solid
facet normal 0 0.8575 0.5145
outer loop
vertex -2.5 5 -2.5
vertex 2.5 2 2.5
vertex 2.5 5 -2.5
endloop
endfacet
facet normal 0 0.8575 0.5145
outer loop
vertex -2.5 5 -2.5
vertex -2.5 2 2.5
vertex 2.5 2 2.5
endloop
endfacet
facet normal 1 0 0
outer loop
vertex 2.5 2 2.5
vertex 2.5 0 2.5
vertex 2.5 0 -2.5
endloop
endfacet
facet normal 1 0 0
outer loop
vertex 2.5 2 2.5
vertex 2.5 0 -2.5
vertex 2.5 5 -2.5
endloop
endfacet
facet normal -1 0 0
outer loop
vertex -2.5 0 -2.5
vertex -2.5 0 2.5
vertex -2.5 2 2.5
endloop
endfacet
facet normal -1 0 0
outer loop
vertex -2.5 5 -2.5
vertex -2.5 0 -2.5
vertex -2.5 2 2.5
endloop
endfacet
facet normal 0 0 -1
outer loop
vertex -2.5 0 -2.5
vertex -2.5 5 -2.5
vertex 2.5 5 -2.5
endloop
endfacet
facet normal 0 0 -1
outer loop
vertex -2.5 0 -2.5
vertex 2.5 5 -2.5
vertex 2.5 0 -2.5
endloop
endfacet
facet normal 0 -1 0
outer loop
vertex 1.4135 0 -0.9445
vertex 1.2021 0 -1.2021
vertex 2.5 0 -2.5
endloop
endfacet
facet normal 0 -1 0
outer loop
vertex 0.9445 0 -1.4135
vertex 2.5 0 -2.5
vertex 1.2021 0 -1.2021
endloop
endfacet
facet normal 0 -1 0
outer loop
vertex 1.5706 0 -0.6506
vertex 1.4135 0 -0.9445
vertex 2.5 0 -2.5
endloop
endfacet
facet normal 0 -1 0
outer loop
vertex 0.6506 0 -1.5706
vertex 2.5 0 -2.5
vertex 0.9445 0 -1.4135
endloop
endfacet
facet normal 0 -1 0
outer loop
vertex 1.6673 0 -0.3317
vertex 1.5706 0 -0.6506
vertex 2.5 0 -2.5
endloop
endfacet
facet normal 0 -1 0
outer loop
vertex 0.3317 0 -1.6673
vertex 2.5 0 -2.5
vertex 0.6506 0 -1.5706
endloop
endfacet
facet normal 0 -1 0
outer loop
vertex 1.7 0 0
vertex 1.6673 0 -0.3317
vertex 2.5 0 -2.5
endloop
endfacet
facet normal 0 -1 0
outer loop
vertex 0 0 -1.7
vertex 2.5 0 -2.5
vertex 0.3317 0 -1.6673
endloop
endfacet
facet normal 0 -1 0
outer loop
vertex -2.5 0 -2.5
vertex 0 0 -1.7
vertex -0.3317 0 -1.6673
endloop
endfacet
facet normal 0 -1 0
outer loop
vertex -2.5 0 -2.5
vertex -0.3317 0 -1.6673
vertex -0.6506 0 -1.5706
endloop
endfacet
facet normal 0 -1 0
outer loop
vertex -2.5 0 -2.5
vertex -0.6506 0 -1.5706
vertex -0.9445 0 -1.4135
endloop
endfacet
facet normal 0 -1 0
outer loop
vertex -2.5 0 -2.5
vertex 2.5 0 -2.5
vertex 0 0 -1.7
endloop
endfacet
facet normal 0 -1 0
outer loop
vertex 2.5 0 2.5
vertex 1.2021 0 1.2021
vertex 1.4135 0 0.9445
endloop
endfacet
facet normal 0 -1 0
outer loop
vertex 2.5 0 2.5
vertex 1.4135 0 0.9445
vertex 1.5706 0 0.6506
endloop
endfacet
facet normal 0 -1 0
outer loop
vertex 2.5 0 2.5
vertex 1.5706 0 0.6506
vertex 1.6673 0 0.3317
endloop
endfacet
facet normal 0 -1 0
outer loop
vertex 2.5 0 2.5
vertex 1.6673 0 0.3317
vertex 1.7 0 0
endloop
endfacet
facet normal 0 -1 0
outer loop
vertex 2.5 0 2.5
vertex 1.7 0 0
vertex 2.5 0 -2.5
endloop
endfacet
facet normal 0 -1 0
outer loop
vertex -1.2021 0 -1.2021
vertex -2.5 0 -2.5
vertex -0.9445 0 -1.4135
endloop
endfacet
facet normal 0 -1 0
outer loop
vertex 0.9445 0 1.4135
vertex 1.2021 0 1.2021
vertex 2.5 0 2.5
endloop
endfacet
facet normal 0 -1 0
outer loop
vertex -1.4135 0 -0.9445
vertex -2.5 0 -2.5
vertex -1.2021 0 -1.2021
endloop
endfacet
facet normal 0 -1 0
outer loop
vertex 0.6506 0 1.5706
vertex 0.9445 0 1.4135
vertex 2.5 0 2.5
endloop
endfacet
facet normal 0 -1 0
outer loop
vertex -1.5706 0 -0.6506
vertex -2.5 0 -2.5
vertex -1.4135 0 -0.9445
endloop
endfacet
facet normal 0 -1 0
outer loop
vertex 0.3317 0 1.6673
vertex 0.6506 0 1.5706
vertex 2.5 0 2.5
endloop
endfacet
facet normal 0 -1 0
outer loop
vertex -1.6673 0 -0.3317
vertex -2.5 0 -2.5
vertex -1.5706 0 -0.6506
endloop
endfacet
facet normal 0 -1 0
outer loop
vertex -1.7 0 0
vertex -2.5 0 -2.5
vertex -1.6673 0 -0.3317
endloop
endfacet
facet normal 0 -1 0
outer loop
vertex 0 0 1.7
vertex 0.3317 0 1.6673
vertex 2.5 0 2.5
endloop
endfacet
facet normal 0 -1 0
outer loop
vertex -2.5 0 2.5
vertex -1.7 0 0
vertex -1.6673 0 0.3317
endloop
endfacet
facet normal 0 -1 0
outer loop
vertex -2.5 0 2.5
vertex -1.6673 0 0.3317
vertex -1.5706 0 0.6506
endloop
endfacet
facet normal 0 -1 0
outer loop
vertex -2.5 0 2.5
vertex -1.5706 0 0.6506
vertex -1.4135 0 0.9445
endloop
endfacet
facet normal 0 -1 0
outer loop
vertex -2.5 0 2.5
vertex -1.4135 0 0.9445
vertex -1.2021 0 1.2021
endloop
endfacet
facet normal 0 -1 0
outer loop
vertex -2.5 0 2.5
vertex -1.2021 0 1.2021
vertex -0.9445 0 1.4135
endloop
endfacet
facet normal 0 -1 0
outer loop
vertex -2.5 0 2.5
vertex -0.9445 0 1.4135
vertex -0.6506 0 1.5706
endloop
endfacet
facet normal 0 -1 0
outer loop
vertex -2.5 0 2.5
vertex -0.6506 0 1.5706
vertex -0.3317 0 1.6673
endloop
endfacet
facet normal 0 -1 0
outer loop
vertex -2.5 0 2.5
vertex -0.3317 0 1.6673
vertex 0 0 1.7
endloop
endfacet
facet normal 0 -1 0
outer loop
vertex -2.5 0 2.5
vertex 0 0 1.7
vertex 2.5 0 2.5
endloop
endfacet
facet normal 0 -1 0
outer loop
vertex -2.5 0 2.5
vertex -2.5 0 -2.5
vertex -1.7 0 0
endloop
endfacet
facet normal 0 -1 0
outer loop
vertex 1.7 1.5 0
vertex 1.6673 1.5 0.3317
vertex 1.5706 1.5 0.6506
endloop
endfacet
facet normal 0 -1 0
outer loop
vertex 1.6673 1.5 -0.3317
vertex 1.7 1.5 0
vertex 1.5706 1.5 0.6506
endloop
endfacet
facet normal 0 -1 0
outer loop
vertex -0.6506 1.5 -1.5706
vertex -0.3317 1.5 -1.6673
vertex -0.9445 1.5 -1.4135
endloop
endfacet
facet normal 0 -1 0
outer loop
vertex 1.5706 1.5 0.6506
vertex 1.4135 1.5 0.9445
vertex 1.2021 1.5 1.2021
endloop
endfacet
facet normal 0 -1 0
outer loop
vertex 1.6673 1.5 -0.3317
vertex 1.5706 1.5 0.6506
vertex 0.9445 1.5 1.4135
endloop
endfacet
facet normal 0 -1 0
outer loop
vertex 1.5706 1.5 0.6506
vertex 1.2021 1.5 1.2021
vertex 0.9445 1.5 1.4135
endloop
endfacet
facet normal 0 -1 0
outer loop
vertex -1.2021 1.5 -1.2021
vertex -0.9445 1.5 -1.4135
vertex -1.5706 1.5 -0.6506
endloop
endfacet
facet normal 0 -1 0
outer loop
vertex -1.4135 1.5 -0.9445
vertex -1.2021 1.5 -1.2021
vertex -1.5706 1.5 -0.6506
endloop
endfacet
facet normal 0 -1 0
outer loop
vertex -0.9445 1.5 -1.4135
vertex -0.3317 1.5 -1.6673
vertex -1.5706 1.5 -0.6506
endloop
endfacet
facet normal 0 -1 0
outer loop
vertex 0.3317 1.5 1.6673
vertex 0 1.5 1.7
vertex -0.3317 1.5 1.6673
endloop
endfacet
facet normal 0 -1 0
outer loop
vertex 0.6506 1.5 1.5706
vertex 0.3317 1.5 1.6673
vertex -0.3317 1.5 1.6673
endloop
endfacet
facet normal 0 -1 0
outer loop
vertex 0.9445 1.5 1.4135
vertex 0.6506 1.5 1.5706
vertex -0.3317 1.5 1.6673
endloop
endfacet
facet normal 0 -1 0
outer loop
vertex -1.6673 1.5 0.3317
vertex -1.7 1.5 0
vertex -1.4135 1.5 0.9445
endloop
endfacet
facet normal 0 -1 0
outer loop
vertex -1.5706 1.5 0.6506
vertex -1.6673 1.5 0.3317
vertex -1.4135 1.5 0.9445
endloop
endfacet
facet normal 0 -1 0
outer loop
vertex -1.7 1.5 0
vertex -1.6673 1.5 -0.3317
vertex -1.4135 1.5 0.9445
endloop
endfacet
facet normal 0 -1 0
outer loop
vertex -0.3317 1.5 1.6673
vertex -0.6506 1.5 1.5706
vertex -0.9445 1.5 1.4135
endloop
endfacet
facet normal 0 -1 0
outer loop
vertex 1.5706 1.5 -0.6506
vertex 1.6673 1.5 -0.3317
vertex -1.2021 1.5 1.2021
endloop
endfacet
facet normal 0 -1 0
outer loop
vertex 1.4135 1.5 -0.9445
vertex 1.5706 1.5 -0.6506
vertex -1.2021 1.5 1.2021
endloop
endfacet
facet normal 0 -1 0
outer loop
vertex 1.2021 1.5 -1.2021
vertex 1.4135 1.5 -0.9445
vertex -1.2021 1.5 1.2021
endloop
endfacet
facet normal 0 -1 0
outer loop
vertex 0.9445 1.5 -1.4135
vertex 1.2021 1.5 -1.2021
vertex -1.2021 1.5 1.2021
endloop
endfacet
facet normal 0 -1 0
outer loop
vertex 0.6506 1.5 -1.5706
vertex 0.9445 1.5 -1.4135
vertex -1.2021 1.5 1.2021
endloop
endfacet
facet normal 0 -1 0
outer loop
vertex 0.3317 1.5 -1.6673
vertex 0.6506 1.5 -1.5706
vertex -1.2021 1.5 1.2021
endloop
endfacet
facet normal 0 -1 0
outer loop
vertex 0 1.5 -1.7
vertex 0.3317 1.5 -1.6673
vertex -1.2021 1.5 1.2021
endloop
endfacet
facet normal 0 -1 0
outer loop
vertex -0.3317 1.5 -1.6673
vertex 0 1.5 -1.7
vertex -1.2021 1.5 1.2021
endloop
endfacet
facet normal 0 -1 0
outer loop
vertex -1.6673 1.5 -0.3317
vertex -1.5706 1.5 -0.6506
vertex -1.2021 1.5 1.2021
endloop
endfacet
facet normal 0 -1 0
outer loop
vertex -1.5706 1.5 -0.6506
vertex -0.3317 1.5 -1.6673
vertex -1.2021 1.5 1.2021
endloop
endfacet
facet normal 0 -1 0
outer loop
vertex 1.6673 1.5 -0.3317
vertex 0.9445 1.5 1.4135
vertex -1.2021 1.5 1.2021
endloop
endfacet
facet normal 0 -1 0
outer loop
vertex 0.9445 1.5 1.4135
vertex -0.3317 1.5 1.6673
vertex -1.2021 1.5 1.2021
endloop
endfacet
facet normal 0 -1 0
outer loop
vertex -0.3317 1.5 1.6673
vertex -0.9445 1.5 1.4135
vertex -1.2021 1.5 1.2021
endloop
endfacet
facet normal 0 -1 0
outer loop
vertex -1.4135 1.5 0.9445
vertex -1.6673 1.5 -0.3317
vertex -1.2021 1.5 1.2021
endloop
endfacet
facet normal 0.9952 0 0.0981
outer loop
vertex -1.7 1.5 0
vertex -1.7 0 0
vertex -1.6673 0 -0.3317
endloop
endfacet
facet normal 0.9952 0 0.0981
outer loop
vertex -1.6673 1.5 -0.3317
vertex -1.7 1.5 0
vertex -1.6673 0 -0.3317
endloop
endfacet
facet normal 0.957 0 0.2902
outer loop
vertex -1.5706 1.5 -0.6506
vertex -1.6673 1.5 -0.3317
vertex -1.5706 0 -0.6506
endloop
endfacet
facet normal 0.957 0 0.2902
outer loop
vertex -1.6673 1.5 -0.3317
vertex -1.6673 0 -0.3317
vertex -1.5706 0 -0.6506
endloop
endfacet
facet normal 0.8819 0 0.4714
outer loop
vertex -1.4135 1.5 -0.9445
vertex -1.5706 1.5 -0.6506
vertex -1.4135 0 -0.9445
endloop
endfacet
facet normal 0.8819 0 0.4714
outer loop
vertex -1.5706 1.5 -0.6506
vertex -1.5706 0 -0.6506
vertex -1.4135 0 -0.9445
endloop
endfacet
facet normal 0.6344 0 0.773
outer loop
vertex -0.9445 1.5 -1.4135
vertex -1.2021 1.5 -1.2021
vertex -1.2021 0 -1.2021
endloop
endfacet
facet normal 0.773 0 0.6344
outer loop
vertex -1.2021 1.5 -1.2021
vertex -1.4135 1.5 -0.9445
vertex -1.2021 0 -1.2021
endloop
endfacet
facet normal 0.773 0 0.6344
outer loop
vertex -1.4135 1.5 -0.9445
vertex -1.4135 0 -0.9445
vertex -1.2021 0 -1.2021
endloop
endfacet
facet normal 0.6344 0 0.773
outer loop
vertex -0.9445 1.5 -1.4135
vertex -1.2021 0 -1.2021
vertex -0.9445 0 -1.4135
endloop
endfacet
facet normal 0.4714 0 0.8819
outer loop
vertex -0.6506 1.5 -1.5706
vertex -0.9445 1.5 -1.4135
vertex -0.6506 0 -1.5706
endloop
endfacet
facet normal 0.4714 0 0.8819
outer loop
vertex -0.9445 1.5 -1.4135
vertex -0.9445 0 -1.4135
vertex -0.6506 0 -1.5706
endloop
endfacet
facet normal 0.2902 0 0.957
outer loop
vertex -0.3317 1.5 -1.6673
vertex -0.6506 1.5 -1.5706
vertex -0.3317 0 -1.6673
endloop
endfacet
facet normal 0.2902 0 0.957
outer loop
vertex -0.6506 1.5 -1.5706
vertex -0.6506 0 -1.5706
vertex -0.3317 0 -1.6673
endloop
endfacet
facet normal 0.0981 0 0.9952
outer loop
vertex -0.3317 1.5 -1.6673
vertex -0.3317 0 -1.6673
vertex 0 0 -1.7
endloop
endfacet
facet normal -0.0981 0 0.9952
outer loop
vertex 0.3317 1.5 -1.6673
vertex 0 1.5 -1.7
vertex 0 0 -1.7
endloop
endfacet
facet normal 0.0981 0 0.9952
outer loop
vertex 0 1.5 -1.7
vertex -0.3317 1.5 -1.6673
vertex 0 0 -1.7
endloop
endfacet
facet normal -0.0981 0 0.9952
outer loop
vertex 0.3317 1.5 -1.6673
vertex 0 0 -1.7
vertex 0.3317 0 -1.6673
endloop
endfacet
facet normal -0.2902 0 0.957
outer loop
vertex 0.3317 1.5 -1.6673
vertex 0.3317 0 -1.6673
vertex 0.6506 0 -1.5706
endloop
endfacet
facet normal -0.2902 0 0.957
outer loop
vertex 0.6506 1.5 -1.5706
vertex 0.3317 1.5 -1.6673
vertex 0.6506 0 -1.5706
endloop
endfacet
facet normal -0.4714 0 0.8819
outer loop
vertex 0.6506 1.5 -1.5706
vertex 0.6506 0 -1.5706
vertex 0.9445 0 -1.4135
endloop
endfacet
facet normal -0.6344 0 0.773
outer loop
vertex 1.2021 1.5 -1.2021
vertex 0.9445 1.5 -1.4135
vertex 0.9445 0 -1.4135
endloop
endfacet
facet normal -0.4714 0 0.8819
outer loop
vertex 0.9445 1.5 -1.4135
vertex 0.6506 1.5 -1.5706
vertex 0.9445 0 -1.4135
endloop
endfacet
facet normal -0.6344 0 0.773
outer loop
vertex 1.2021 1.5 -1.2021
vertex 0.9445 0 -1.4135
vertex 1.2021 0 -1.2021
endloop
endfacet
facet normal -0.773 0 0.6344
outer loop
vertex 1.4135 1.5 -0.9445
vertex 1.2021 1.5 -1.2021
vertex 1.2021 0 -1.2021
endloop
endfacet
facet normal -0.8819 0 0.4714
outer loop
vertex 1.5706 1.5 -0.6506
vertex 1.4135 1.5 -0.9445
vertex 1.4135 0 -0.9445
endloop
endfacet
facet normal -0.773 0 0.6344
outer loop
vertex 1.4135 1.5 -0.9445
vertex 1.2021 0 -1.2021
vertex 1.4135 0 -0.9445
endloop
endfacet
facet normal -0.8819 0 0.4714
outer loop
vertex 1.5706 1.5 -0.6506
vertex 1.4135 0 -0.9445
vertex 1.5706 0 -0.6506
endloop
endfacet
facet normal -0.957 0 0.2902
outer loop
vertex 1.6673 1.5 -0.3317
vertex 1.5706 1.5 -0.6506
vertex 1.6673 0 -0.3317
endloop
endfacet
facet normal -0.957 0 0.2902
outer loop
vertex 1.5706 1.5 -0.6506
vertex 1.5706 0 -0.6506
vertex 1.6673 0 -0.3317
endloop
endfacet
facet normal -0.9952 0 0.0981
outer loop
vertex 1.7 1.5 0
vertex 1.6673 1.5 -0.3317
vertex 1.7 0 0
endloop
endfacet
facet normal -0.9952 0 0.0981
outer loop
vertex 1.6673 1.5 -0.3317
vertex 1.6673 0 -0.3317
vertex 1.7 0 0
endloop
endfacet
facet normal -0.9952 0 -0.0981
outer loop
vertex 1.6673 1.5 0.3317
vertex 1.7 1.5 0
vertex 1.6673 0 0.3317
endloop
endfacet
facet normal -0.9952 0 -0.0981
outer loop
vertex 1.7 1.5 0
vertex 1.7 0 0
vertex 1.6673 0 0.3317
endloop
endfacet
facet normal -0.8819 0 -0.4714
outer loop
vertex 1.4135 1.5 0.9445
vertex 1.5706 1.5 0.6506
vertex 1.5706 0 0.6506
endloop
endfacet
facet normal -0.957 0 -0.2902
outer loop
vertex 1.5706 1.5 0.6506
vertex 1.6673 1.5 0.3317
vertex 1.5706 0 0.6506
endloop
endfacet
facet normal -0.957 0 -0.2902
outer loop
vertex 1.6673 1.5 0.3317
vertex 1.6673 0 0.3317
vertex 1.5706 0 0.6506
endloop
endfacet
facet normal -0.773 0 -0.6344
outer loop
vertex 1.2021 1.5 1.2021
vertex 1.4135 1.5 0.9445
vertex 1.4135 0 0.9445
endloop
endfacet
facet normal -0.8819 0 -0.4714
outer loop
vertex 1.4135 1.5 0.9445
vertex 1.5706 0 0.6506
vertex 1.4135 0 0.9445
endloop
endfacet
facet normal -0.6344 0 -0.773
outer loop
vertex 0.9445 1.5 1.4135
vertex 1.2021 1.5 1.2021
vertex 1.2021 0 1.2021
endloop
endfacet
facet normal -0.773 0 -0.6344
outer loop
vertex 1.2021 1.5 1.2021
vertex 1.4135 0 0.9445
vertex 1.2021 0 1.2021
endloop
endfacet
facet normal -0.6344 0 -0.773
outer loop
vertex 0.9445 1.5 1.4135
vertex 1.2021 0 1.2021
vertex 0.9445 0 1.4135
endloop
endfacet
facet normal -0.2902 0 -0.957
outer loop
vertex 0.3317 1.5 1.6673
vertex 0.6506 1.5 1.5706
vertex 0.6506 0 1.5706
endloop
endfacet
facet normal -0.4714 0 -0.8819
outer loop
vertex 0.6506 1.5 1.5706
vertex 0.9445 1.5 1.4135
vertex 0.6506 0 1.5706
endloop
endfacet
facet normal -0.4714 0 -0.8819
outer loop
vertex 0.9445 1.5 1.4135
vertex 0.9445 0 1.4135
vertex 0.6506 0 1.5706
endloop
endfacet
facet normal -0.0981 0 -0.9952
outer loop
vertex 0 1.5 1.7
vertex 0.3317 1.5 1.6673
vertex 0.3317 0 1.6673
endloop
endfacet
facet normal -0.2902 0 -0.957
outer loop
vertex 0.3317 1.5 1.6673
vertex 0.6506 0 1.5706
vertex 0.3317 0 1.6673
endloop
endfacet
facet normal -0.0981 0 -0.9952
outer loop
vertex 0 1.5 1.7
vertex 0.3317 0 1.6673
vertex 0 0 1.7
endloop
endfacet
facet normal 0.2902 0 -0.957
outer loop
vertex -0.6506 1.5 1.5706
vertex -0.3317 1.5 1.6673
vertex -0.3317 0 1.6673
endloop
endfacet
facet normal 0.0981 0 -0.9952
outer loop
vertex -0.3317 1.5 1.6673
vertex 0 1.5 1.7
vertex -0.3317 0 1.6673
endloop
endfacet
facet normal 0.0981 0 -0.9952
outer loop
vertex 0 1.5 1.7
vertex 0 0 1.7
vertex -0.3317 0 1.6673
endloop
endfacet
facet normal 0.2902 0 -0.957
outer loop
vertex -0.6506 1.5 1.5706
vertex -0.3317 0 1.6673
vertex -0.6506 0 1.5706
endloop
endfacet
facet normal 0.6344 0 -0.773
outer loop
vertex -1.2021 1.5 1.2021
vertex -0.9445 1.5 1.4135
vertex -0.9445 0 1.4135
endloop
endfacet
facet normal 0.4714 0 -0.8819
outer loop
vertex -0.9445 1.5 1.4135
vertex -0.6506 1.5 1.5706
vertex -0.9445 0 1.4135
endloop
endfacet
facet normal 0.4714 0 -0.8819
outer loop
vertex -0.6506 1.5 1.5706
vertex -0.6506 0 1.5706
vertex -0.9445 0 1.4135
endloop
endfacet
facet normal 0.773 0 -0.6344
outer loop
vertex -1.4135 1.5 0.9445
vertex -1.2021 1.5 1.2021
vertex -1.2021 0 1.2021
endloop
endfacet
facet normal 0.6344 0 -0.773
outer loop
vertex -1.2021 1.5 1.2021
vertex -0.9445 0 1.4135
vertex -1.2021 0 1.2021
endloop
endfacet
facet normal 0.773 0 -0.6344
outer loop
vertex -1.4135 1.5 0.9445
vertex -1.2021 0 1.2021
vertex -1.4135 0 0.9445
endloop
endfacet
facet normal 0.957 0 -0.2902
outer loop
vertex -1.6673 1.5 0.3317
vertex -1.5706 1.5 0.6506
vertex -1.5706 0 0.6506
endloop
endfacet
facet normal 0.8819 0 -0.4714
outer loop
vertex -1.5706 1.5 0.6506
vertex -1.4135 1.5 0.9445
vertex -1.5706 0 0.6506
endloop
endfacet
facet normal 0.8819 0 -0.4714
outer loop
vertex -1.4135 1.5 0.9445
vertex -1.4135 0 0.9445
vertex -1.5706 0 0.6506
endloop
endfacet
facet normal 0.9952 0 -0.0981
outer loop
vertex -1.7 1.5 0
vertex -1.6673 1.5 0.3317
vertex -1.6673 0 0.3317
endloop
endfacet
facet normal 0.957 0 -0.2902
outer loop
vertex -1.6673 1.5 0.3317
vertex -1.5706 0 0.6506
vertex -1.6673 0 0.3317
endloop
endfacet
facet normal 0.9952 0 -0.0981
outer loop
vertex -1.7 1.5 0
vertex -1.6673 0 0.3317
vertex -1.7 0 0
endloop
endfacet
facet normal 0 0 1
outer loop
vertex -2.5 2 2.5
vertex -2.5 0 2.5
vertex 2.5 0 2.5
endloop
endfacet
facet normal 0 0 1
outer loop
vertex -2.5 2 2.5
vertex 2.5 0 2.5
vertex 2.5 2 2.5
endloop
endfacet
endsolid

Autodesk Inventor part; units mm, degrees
ref_plane "YZ Plane" through (0, 0, 0) normal (1, 0, 0) x (0, 1, 0)
ref_plane "XZ Plane" through (0, 0, 0) normal (0, 1, 0) x (-1, 0, 0)
ref_plane "XY Plane" through (0, 0, 0) normal (0, 0, 1) x (1, 0, 0)
sketch "草圖1" plane through (0, 0, 0) normal (0, 1, 0) x (-1, 0, 0)
  line L0 (2.5, 2.5) -> (-2.5, 2.5)
  line L1 (-2.5, 2.5) -> (-2.5, -2.5)
  line L2 (-2.5, -2.5) -> (2.5, -2.5)
  line L3 (2.5, -2.5) -> (2.5, 2.5)
  circle A0 centre (0, 0) radius 1.7
  point P0 (0, -2.5)
  point P1 (2.5, 0)
  dimension "d0" = 5
  dimension "d1" = 5
  dimension "d2" = 3.4
sketch "草圖2" plane through (0, 0, 0) normal (1, 0, 0) x (0, 1, 0)
  line L0 (0, -2.5) -> (0, 2.5) projected
  line L1 (5, -2.5) -> (0, -2.5)
  line L2 (0, 0) -> (1.5, 0)
  line L3 (0, 2.5) -> (2, 2.5)
  line L4 (2, 2.5) -> (5, -2.5)
  point P0 (0, 2.5)
  dimension "d3" = 1.5
  dimension "d7" = 2
  dimension "d8" = 5
extrude "擠出1" add sketch "草圖2" along normal mid plane 5
extrude "擠出2" cut sketch "草圖1" along normal blind 1.5 contours A0
properties part number "110033226_ipt_14_草地三"
